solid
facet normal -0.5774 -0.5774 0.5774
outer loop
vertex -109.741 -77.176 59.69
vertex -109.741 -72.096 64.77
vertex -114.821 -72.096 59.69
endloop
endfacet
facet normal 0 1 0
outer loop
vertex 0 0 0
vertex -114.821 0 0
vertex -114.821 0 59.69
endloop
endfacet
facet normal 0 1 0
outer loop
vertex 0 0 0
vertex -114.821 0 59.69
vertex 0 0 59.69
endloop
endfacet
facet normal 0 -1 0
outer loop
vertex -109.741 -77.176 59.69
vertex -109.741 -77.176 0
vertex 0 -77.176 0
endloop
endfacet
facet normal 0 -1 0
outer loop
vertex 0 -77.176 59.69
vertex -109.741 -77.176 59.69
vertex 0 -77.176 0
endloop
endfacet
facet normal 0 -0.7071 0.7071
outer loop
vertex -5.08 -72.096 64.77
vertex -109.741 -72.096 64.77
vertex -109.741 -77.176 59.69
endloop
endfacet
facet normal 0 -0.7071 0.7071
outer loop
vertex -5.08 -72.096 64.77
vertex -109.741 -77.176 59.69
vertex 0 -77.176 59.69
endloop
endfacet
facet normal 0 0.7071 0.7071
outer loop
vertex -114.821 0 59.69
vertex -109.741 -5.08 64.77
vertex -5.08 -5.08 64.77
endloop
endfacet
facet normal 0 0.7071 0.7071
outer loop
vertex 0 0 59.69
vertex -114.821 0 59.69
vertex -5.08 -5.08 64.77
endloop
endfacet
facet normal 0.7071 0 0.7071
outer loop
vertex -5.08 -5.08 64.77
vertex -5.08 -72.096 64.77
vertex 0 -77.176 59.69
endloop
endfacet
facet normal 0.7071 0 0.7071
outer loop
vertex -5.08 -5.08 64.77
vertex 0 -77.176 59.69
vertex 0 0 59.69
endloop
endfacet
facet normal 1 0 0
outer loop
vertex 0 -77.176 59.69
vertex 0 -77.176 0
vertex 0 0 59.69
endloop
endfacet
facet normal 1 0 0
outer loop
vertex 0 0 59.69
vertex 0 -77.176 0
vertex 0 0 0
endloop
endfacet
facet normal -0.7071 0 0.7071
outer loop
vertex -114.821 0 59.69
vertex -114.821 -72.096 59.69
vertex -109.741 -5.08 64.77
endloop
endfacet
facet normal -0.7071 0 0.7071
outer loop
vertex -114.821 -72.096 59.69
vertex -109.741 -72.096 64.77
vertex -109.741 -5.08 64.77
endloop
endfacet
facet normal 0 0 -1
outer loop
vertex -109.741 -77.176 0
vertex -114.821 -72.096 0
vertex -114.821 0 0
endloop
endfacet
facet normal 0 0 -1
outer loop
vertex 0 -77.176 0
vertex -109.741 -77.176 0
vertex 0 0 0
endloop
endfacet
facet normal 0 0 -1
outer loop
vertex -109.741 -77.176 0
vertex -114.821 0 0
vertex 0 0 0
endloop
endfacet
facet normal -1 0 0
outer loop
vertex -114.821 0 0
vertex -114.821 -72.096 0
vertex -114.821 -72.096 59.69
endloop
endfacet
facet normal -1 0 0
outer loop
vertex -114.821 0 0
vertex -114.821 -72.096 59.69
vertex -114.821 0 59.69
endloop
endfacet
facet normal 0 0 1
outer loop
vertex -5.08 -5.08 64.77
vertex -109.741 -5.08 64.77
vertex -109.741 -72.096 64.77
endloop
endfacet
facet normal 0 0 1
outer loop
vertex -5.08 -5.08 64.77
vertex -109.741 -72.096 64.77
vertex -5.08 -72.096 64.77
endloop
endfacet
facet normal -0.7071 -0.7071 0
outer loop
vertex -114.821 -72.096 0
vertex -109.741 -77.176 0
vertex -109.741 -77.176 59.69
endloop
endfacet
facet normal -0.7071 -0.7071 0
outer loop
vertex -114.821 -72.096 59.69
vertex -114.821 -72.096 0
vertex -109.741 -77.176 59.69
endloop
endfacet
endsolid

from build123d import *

# Parameters (mm, degrees)
F0_W     = 114.821017
F0_H     = 77.175923
F1_DEPTH = 64.77
F2_SIZE  = 5.08


with BuildPart() as f1:
    # F0 (on Top) → F1 (new body)
    with BuildSketch(Plane.XY):
        with Locations((-57.410508, -38.587961)):
            Rectangle(F0_W, F0_H)
    extrude(amount=F1_DEPTH)

    # F2
    f2_edges = [f1.edges().sort_by_distance(p)[0] for p in [
        (-114.821017, -38.587961, 64.77),
        (-57.410508, 0, 64.77),
        (0, -38.587961, 64.77),
        (-57.410508, -77.175923, 64.77),
        (-114.821017, -77.175923, 32.385),
    ]]
    chamfer(f2_edges, length=F2_SIZE)


solid = f1.part
